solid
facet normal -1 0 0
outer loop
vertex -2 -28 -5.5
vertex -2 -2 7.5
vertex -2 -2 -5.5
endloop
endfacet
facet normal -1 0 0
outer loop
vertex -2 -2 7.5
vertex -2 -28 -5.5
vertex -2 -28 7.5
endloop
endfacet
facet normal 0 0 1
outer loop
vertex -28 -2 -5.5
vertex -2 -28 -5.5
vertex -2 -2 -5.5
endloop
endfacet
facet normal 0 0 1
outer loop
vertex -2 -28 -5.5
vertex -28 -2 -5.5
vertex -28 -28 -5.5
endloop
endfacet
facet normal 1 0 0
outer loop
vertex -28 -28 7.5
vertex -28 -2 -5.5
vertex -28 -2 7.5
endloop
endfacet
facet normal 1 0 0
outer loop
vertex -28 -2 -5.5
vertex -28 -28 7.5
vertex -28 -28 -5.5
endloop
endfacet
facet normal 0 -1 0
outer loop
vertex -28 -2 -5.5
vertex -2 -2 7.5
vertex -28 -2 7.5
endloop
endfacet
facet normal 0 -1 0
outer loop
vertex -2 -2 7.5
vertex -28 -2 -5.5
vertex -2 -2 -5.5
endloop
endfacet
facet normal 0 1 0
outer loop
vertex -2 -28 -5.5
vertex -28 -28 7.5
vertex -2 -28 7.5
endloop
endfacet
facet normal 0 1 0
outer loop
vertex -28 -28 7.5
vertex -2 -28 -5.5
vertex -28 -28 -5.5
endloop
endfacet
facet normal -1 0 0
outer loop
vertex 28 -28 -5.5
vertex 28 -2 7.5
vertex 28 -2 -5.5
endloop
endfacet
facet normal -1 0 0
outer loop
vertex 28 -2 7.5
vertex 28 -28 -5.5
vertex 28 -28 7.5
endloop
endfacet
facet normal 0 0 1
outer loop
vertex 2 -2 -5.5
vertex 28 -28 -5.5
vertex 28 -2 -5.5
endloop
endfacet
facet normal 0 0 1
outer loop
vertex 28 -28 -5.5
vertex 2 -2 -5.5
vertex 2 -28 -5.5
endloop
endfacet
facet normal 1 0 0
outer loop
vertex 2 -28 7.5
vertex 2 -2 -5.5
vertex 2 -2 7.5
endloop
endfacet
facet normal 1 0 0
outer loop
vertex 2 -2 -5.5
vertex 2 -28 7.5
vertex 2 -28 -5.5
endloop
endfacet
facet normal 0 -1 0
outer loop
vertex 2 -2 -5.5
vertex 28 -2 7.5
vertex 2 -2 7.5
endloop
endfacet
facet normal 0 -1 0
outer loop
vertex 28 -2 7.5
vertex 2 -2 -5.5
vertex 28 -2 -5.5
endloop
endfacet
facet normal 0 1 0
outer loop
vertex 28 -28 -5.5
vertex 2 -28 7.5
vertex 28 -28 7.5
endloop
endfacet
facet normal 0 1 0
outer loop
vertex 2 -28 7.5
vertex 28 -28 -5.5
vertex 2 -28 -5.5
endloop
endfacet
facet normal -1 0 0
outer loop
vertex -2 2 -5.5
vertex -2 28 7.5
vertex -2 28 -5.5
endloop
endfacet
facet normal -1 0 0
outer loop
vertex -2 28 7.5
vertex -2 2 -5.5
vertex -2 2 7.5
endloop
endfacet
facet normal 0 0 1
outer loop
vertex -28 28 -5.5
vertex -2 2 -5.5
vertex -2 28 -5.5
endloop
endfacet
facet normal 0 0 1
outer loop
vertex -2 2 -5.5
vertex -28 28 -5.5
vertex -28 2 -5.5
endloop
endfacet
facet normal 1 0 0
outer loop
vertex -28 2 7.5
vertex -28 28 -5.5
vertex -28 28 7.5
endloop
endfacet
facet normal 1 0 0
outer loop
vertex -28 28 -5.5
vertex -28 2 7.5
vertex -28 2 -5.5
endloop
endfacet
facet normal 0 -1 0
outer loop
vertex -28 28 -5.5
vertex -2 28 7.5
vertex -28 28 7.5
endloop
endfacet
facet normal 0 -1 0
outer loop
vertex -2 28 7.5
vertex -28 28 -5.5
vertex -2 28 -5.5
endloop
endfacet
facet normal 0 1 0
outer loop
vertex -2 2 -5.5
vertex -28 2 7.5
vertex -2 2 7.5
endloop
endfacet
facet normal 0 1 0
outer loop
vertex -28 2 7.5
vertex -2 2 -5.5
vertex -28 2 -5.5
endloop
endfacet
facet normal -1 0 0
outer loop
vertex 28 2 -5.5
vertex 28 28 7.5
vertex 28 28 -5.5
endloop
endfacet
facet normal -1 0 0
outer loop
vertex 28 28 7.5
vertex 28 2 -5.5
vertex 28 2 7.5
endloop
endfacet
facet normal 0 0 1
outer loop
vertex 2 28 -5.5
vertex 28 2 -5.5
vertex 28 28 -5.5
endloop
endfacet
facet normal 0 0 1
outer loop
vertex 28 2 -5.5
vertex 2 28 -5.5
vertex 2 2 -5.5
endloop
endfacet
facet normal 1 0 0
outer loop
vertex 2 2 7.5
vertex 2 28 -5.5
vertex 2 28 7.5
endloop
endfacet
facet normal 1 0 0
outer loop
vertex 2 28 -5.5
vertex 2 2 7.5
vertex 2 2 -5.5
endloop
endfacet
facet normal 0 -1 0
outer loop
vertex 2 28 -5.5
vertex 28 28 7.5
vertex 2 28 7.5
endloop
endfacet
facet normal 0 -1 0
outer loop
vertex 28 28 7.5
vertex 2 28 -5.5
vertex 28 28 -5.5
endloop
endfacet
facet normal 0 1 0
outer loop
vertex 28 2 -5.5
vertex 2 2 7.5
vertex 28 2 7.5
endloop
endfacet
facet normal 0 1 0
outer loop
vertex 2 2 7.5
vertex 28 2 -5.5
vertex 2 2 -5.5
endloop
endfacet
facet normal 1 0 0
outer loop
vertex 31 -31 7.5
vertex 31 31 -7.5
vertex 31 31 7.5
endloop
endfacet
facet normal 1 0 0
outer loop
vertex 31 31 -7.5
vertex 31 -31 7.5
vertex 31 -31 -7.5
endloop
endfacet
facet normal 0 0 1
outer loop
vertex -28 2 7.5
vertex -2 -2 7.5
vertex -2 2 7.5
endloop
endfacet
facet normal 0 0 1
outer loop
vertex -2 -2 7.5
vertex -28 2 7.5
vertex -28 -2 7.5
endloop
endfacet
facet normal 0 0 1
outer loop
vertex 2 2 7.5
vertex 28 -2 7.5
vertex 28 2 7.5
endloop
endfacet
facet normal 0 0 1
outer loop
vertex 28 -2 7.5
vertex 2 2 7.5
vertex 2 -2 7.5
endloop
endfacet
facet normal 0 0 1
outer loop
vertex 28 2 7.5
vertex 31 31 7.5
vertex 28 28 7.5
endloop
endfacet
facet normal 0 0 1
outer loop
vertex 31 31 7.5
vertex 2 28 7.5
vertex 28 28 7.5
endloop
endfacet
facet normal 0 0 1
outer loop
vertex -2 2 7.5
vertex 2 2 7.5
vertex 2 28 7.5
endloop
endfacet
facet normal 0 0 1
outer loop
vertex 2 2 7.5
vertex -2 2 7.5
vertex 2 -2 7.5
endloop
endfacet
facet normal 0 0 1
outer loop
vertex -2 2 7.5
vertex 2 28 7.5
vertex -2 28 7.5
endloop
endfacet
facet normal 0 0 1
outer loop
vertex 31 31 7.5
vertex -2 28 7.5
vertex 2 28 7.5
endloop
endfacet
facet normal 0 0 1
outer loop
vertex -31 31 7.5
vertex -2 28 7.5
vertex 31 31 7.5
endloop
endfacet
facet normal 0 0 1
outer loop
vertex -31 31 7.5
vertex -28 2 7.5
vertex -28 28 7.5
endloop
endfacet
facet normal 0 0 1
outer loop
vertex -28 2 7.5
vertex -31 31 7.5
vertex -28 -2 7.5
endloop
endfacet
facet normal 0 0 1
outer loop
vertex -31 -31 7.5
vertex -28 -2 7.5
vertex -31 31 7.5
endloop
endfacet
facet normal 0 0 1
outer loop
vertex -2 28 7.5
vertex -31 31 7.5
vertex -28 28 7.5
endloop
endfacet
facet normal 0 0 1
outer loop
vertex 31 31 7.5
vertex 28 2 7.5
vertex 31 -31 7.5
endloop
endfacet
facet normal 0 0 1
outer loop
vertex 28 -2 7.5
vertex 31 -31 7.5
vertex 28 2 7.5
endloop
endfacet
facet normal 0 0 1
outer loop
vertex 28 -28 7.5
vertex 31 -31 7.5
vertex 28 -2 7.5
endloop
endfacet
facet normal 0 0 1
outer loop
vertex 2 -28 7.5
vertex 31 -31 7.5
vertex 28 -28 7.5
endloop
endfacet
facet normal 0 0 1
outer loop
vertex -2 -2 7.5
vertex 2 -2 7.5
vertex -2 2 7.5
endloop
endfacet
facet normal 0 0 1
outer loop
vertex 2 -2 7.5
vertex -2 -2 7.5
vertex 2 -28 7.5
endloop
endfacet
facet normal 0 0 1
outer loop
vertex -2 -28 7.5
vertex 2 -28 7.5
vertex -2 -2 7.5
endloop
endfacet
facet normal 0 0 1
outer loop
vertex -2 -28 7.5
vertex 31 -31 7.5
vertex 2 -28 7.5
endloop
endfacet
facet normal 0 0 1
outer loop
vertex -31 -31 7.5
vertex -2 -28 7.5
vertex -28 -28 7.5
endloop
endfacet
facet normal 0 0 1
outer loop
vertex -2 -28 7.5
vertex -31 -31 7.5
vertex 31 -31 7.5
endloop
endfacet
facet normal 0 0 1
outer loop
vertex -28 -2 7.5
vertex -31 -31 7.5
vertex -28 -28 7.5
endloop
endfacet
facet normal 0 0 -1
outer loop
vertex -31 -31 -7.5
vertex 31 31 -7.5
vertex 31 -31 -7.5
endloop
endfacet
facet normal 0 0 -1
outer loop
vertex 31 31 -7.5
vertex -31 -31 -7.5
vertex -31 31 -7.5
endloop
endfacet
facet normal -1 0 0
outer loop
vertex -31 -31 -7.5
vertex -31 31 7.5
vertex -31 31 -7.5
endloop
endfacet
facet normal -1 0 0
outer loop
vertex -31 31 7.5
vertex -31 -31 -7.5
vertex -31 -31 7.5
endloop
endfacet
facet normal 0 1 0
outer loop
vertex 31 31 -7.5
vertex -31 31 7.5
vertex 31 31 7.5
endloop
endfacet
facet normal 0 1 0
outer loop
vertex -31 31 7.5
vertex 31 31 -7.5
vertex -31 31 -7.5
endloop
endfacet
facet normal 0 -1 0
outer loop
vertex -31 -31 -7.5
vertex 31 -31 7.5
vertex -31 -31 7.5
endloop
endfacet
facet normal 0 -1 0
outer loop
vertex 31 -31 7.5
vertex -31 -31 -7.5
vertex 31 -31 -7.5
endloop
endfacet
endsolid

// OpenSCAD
$fn = 32;

// ----------------------------------------------------------------------
// Pocket plate 62 x 62 x 15
// 2 x 2 pockets 26 mm square, 13 mm deep
// ----------------------------------------------------------------------

// --- parameters (mm) ---
thickness = 15;  // plate thickness
floor_t = 2;     // material left under each pocket
pocket = 26;     // pocket side length
pitch_x = 30;    // pocket pitch along X
pitch_y = 30;    // pocket pitch along Y
cols = 2;        // pockets per row
rows = 2;        // rows of pockets

// --- derived feature positions (mm) ---
depth = thickness - floor_t;        // = 13   pocket depth, down to the floor
span_x = (cols - 1) * pitch_x;      // = 30   distance between outer pockets
span_y = (rows - 1) * pitch_y;      // = 30   distance between outer pocket rows
origin_x = -span_x / 2;             // = -15   X of the first pocket
origin_y = -span_y / 2;             // = -15   Y of the first pocket
plate = [span_x + pocket + 6, span_y + pocket + 6, thickness];  // = [62, 62, 15]   overall size: pockets plus 3 mm of wall on each side
feature_centers = [
  [origin_x + 0 * pitch_x, origin_y + 0 * pitch_y],
  [origin_x + 1 * pitch_x, origin_y + 0 * pitch_y],
  [origin_x + 0 * pitch_x, origin_y + 1 * pitch_y],
  [origin_x + 1 * pitch_x, origin_y + 1 * pitch_y]
];   // pocket centres, used verbatim by the cutter loop

// plate outline, then one pocket per centre in feature_centers
difference() {
  cube(plate, center = true);
  for (centre = feature_centers)
    translate([centre[0] - pocket / 2, centre[1] - pocket / 2, plate[2] / 2 - depth])
      cube([pocket, pocket, depth + 1]);  // centred on the declared pocket centre
}
